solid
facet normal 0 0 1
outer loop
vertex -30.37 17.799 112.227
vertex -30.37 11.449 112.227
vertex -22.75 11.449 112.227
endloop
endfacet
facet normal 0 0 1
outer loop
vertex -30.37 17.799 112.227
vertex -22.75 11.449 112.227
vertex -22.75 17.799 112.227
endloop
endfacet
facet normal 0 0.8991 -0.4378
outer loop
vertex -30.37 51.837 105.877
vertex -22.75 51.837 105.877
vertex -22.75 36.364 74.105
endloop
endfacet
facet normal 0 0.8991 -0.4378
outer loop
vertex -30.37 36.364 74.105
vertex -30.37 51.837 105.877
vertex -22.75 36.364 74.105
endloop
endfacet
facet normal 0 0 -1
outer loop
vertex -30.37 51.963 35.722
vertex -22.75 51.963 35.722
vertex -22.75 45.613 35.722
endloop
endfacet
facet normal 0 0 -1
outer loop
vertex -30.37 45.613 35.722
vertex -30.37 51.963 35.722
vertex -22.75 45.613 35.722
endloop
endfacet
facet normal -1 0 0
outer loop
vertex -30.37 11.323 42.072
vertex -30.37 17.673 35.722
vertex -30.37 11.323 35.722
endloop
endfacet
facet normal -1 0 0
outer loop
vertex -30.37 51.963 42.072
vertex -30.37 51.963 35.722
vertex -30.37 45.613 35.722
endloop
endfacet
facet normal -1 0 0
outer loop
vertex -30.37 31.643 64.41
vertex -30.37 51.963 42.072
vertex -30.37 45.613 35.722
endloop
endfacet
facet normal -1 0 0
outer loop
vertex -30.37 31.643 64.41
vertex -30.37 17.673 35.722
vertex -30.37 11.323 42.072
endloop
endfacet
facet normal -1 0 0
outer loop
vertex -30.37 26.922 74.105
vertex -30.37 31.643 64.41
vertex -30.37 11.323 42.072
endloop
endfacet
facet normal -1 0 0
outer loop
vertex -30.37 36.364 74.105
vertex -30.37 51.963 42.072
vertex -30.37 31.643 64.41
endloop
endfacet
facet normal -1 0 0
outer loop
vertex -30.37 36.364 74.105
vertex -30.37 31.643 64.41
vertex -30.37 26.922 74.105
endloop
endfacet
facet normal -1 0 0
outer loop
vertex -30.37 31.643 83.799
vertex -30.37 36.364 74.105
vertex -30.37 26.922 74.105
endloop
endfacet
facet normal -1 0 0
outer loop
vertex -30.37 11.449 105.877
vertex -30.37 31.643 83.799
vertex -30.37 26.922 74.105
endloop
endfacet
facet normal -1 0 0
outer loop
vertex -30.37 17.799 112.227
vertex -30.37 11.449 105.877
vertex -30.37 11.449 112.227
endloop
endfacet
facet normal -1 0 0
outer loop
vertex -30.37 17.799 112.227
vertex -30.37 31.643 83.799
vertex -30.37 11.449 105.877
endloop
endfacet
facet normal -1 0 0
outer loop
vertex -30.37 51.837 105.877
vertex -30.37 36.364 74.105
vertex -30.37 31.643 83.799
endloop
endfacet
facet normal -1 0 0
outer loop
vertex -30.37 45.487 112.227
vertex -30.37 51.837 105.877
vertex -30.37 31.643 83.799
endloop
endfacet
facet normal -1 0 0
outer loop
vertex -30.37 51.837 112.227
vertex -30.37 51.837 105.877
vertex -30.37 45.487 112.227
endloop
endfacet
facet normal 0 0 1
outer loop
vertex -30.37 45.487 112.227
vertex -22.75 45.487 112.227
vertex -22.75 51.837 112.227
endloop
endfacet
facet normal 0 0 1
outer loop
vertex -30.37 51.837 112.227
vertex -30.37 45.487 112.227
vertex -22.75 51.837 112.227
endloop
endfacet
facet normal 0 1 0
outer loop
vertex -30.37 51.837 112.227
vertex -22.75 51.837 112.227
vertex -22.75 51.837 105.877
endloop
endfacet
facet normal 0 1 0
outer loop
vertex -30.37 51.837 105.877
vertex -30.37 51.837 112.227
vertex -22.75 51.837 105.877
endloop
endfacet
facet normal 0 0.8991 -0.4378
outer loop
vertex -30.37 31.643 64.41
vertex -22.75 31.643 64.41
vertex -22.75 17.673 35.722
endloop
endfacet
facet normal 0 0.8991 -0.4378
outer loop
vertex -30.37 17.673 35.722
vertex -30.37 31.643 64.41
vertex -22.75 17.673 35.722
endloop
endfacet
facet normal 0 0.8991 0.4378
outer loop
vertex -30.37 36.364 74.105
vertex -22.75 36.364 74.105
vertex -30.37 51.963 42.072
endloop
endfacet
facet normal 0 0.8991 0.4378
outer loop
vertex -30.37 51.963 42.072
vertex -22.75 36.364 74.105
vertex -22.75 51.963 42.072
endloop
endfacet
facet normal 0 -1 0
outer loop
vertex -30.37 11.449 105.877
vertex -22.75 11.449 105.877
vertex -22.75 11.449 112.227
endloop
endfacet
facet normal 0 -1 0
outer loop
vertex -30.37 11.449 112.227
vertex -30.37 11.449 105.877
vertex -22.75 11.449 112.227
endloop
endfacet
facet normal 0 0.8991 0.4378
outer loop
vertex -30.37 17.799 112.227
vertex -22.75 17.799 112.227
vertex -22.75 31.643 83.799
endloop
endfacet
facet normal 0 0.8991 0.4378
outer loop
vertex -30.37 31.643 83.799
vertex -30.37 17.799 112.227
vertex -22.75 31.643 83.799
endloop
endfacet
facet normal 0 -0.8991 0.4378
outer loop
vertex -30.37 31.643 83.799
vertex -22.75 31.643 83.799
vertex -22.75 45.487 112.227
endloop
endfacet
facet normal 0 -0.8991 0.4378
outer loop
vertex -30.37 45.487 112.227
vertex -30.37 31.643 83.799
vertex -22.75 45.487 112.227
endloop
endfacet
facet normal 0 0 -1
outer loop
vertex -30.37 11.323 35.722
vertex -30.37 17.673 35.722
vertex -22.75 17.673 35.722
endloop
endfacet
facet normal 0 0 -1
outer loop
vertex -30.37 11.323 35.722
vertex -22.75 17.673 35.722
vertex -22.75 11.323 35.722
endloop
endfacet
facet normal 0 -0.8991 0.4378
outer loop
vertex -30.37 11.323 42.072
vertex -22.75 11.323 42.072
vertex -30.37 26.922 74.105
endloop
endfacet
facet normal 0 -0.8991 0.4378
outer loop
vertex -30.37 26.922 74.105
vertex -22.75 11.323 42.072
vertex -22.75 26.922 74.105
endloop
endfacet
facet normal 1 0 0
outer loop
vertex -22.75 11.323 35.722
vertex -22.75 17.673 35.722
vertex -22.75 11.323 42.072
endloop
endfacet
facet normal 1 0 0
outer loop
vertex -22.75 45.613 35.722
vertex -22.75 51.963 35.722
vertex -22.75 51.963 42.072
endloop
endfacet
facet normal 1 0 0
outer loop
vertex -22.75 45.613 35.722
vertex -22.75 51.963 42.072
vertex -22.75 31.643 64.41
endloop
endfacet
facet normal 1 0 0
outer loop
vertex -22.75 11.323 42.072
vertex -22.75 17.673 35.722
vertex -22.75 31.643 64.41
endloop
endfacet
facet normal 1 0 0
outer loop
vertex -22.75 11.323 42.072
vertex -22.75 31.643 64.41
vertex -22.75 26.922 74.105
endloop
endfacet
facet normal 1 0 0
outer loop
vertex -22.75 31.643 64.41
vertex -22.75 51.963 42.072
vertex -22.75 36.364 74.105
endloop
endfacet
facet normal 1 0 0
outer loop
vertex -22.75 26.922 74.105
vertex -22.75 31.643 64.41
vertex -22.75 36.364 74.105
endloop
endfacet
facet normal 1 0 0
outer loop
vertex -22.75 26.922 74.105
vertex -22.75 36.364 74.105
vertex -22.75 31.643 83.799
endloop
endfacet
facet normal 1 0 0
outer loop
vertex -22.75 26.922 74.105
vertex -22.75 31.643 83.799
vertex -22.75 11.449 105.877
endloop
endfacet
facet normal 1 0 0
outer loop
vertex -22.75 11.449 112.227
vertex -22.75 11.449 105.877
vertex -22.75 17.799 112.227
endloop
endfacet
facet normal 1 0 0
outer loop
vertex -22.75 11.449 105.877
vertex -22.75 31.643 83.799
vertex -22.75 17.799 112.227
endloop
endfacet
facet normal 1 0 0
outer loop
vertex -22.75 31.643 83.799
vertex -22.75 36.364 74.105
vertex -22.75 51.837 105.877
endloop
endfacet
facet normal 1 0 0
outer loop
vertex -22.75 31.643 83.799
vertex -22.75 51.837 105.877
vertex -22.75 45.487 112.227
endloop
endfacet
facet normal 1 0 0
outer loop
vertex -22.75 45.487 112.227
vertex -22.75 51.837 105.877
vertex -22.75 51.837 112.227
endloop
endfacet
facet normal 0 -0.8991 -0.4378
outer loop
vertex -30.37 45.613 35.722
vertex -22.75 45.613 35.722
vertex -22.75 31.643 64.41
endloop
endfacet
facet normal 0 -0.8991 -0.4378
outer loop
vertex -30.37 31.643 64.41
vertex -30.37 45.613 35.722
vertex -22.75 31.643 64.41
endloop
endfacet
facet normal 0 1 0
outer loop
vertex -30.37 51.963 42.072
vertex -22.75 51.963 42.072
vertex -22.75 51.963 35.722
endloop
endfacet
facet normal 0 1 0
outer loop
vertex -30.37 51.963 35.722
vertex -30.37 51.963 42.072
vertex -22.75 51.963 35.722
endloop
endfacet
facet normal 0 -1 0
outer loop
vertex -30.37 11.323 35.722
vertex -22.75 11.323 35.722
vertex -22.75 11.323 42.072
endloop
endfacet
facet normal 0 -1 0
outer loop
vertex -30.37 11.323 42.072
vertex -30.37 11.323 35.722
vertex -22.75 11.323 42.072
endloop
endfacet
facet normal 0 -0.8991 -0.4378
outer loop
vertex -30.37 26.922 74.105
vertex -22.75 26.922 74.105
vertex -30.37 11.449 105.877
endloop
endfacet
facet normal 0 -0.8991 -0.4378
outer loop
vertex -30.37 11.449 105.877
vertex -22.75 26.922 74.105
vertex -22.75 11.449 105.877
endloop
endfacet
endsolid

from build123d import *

# Parameters (mm, degrees)
BOSS_EXTRUDE1_DEPTH = 7.62


with BuildPart() as part:
    # Sketch1 → Boss-Extrude1 (new body)
    with BuildSketch(Plane(origin=(-22.749553377, 0, 0), x_dir=(0, 0, -1), z_dir=(1, 0, 0))):
        Polygon((-112.227241806, 51.836669294), (-105.877241806, 51.836669294), (-74.104597168, 36.364189717), (-42.072441806, 51.963044496), (-35.722441806, 51.963044496), (-35.722441806, 45.613044496), (-64.409753583, 31.643044496), (-35.722441806, 17.673044496), (-35.722441806, 11.323044496), (-42.072441806, 11.323044496), (-74.104597168, 26.921899275), (-105.877241806, 11.449419699), (-112.227241806, 11.449419699), (-112.227241806, 17.799419699), (-83.799440754, 31.643044496), (-112.227241806, 45.486669294), align=None)
    extrude(amount=-BOSS_EXTRUDE1_DEPTH)


solid = part.part
